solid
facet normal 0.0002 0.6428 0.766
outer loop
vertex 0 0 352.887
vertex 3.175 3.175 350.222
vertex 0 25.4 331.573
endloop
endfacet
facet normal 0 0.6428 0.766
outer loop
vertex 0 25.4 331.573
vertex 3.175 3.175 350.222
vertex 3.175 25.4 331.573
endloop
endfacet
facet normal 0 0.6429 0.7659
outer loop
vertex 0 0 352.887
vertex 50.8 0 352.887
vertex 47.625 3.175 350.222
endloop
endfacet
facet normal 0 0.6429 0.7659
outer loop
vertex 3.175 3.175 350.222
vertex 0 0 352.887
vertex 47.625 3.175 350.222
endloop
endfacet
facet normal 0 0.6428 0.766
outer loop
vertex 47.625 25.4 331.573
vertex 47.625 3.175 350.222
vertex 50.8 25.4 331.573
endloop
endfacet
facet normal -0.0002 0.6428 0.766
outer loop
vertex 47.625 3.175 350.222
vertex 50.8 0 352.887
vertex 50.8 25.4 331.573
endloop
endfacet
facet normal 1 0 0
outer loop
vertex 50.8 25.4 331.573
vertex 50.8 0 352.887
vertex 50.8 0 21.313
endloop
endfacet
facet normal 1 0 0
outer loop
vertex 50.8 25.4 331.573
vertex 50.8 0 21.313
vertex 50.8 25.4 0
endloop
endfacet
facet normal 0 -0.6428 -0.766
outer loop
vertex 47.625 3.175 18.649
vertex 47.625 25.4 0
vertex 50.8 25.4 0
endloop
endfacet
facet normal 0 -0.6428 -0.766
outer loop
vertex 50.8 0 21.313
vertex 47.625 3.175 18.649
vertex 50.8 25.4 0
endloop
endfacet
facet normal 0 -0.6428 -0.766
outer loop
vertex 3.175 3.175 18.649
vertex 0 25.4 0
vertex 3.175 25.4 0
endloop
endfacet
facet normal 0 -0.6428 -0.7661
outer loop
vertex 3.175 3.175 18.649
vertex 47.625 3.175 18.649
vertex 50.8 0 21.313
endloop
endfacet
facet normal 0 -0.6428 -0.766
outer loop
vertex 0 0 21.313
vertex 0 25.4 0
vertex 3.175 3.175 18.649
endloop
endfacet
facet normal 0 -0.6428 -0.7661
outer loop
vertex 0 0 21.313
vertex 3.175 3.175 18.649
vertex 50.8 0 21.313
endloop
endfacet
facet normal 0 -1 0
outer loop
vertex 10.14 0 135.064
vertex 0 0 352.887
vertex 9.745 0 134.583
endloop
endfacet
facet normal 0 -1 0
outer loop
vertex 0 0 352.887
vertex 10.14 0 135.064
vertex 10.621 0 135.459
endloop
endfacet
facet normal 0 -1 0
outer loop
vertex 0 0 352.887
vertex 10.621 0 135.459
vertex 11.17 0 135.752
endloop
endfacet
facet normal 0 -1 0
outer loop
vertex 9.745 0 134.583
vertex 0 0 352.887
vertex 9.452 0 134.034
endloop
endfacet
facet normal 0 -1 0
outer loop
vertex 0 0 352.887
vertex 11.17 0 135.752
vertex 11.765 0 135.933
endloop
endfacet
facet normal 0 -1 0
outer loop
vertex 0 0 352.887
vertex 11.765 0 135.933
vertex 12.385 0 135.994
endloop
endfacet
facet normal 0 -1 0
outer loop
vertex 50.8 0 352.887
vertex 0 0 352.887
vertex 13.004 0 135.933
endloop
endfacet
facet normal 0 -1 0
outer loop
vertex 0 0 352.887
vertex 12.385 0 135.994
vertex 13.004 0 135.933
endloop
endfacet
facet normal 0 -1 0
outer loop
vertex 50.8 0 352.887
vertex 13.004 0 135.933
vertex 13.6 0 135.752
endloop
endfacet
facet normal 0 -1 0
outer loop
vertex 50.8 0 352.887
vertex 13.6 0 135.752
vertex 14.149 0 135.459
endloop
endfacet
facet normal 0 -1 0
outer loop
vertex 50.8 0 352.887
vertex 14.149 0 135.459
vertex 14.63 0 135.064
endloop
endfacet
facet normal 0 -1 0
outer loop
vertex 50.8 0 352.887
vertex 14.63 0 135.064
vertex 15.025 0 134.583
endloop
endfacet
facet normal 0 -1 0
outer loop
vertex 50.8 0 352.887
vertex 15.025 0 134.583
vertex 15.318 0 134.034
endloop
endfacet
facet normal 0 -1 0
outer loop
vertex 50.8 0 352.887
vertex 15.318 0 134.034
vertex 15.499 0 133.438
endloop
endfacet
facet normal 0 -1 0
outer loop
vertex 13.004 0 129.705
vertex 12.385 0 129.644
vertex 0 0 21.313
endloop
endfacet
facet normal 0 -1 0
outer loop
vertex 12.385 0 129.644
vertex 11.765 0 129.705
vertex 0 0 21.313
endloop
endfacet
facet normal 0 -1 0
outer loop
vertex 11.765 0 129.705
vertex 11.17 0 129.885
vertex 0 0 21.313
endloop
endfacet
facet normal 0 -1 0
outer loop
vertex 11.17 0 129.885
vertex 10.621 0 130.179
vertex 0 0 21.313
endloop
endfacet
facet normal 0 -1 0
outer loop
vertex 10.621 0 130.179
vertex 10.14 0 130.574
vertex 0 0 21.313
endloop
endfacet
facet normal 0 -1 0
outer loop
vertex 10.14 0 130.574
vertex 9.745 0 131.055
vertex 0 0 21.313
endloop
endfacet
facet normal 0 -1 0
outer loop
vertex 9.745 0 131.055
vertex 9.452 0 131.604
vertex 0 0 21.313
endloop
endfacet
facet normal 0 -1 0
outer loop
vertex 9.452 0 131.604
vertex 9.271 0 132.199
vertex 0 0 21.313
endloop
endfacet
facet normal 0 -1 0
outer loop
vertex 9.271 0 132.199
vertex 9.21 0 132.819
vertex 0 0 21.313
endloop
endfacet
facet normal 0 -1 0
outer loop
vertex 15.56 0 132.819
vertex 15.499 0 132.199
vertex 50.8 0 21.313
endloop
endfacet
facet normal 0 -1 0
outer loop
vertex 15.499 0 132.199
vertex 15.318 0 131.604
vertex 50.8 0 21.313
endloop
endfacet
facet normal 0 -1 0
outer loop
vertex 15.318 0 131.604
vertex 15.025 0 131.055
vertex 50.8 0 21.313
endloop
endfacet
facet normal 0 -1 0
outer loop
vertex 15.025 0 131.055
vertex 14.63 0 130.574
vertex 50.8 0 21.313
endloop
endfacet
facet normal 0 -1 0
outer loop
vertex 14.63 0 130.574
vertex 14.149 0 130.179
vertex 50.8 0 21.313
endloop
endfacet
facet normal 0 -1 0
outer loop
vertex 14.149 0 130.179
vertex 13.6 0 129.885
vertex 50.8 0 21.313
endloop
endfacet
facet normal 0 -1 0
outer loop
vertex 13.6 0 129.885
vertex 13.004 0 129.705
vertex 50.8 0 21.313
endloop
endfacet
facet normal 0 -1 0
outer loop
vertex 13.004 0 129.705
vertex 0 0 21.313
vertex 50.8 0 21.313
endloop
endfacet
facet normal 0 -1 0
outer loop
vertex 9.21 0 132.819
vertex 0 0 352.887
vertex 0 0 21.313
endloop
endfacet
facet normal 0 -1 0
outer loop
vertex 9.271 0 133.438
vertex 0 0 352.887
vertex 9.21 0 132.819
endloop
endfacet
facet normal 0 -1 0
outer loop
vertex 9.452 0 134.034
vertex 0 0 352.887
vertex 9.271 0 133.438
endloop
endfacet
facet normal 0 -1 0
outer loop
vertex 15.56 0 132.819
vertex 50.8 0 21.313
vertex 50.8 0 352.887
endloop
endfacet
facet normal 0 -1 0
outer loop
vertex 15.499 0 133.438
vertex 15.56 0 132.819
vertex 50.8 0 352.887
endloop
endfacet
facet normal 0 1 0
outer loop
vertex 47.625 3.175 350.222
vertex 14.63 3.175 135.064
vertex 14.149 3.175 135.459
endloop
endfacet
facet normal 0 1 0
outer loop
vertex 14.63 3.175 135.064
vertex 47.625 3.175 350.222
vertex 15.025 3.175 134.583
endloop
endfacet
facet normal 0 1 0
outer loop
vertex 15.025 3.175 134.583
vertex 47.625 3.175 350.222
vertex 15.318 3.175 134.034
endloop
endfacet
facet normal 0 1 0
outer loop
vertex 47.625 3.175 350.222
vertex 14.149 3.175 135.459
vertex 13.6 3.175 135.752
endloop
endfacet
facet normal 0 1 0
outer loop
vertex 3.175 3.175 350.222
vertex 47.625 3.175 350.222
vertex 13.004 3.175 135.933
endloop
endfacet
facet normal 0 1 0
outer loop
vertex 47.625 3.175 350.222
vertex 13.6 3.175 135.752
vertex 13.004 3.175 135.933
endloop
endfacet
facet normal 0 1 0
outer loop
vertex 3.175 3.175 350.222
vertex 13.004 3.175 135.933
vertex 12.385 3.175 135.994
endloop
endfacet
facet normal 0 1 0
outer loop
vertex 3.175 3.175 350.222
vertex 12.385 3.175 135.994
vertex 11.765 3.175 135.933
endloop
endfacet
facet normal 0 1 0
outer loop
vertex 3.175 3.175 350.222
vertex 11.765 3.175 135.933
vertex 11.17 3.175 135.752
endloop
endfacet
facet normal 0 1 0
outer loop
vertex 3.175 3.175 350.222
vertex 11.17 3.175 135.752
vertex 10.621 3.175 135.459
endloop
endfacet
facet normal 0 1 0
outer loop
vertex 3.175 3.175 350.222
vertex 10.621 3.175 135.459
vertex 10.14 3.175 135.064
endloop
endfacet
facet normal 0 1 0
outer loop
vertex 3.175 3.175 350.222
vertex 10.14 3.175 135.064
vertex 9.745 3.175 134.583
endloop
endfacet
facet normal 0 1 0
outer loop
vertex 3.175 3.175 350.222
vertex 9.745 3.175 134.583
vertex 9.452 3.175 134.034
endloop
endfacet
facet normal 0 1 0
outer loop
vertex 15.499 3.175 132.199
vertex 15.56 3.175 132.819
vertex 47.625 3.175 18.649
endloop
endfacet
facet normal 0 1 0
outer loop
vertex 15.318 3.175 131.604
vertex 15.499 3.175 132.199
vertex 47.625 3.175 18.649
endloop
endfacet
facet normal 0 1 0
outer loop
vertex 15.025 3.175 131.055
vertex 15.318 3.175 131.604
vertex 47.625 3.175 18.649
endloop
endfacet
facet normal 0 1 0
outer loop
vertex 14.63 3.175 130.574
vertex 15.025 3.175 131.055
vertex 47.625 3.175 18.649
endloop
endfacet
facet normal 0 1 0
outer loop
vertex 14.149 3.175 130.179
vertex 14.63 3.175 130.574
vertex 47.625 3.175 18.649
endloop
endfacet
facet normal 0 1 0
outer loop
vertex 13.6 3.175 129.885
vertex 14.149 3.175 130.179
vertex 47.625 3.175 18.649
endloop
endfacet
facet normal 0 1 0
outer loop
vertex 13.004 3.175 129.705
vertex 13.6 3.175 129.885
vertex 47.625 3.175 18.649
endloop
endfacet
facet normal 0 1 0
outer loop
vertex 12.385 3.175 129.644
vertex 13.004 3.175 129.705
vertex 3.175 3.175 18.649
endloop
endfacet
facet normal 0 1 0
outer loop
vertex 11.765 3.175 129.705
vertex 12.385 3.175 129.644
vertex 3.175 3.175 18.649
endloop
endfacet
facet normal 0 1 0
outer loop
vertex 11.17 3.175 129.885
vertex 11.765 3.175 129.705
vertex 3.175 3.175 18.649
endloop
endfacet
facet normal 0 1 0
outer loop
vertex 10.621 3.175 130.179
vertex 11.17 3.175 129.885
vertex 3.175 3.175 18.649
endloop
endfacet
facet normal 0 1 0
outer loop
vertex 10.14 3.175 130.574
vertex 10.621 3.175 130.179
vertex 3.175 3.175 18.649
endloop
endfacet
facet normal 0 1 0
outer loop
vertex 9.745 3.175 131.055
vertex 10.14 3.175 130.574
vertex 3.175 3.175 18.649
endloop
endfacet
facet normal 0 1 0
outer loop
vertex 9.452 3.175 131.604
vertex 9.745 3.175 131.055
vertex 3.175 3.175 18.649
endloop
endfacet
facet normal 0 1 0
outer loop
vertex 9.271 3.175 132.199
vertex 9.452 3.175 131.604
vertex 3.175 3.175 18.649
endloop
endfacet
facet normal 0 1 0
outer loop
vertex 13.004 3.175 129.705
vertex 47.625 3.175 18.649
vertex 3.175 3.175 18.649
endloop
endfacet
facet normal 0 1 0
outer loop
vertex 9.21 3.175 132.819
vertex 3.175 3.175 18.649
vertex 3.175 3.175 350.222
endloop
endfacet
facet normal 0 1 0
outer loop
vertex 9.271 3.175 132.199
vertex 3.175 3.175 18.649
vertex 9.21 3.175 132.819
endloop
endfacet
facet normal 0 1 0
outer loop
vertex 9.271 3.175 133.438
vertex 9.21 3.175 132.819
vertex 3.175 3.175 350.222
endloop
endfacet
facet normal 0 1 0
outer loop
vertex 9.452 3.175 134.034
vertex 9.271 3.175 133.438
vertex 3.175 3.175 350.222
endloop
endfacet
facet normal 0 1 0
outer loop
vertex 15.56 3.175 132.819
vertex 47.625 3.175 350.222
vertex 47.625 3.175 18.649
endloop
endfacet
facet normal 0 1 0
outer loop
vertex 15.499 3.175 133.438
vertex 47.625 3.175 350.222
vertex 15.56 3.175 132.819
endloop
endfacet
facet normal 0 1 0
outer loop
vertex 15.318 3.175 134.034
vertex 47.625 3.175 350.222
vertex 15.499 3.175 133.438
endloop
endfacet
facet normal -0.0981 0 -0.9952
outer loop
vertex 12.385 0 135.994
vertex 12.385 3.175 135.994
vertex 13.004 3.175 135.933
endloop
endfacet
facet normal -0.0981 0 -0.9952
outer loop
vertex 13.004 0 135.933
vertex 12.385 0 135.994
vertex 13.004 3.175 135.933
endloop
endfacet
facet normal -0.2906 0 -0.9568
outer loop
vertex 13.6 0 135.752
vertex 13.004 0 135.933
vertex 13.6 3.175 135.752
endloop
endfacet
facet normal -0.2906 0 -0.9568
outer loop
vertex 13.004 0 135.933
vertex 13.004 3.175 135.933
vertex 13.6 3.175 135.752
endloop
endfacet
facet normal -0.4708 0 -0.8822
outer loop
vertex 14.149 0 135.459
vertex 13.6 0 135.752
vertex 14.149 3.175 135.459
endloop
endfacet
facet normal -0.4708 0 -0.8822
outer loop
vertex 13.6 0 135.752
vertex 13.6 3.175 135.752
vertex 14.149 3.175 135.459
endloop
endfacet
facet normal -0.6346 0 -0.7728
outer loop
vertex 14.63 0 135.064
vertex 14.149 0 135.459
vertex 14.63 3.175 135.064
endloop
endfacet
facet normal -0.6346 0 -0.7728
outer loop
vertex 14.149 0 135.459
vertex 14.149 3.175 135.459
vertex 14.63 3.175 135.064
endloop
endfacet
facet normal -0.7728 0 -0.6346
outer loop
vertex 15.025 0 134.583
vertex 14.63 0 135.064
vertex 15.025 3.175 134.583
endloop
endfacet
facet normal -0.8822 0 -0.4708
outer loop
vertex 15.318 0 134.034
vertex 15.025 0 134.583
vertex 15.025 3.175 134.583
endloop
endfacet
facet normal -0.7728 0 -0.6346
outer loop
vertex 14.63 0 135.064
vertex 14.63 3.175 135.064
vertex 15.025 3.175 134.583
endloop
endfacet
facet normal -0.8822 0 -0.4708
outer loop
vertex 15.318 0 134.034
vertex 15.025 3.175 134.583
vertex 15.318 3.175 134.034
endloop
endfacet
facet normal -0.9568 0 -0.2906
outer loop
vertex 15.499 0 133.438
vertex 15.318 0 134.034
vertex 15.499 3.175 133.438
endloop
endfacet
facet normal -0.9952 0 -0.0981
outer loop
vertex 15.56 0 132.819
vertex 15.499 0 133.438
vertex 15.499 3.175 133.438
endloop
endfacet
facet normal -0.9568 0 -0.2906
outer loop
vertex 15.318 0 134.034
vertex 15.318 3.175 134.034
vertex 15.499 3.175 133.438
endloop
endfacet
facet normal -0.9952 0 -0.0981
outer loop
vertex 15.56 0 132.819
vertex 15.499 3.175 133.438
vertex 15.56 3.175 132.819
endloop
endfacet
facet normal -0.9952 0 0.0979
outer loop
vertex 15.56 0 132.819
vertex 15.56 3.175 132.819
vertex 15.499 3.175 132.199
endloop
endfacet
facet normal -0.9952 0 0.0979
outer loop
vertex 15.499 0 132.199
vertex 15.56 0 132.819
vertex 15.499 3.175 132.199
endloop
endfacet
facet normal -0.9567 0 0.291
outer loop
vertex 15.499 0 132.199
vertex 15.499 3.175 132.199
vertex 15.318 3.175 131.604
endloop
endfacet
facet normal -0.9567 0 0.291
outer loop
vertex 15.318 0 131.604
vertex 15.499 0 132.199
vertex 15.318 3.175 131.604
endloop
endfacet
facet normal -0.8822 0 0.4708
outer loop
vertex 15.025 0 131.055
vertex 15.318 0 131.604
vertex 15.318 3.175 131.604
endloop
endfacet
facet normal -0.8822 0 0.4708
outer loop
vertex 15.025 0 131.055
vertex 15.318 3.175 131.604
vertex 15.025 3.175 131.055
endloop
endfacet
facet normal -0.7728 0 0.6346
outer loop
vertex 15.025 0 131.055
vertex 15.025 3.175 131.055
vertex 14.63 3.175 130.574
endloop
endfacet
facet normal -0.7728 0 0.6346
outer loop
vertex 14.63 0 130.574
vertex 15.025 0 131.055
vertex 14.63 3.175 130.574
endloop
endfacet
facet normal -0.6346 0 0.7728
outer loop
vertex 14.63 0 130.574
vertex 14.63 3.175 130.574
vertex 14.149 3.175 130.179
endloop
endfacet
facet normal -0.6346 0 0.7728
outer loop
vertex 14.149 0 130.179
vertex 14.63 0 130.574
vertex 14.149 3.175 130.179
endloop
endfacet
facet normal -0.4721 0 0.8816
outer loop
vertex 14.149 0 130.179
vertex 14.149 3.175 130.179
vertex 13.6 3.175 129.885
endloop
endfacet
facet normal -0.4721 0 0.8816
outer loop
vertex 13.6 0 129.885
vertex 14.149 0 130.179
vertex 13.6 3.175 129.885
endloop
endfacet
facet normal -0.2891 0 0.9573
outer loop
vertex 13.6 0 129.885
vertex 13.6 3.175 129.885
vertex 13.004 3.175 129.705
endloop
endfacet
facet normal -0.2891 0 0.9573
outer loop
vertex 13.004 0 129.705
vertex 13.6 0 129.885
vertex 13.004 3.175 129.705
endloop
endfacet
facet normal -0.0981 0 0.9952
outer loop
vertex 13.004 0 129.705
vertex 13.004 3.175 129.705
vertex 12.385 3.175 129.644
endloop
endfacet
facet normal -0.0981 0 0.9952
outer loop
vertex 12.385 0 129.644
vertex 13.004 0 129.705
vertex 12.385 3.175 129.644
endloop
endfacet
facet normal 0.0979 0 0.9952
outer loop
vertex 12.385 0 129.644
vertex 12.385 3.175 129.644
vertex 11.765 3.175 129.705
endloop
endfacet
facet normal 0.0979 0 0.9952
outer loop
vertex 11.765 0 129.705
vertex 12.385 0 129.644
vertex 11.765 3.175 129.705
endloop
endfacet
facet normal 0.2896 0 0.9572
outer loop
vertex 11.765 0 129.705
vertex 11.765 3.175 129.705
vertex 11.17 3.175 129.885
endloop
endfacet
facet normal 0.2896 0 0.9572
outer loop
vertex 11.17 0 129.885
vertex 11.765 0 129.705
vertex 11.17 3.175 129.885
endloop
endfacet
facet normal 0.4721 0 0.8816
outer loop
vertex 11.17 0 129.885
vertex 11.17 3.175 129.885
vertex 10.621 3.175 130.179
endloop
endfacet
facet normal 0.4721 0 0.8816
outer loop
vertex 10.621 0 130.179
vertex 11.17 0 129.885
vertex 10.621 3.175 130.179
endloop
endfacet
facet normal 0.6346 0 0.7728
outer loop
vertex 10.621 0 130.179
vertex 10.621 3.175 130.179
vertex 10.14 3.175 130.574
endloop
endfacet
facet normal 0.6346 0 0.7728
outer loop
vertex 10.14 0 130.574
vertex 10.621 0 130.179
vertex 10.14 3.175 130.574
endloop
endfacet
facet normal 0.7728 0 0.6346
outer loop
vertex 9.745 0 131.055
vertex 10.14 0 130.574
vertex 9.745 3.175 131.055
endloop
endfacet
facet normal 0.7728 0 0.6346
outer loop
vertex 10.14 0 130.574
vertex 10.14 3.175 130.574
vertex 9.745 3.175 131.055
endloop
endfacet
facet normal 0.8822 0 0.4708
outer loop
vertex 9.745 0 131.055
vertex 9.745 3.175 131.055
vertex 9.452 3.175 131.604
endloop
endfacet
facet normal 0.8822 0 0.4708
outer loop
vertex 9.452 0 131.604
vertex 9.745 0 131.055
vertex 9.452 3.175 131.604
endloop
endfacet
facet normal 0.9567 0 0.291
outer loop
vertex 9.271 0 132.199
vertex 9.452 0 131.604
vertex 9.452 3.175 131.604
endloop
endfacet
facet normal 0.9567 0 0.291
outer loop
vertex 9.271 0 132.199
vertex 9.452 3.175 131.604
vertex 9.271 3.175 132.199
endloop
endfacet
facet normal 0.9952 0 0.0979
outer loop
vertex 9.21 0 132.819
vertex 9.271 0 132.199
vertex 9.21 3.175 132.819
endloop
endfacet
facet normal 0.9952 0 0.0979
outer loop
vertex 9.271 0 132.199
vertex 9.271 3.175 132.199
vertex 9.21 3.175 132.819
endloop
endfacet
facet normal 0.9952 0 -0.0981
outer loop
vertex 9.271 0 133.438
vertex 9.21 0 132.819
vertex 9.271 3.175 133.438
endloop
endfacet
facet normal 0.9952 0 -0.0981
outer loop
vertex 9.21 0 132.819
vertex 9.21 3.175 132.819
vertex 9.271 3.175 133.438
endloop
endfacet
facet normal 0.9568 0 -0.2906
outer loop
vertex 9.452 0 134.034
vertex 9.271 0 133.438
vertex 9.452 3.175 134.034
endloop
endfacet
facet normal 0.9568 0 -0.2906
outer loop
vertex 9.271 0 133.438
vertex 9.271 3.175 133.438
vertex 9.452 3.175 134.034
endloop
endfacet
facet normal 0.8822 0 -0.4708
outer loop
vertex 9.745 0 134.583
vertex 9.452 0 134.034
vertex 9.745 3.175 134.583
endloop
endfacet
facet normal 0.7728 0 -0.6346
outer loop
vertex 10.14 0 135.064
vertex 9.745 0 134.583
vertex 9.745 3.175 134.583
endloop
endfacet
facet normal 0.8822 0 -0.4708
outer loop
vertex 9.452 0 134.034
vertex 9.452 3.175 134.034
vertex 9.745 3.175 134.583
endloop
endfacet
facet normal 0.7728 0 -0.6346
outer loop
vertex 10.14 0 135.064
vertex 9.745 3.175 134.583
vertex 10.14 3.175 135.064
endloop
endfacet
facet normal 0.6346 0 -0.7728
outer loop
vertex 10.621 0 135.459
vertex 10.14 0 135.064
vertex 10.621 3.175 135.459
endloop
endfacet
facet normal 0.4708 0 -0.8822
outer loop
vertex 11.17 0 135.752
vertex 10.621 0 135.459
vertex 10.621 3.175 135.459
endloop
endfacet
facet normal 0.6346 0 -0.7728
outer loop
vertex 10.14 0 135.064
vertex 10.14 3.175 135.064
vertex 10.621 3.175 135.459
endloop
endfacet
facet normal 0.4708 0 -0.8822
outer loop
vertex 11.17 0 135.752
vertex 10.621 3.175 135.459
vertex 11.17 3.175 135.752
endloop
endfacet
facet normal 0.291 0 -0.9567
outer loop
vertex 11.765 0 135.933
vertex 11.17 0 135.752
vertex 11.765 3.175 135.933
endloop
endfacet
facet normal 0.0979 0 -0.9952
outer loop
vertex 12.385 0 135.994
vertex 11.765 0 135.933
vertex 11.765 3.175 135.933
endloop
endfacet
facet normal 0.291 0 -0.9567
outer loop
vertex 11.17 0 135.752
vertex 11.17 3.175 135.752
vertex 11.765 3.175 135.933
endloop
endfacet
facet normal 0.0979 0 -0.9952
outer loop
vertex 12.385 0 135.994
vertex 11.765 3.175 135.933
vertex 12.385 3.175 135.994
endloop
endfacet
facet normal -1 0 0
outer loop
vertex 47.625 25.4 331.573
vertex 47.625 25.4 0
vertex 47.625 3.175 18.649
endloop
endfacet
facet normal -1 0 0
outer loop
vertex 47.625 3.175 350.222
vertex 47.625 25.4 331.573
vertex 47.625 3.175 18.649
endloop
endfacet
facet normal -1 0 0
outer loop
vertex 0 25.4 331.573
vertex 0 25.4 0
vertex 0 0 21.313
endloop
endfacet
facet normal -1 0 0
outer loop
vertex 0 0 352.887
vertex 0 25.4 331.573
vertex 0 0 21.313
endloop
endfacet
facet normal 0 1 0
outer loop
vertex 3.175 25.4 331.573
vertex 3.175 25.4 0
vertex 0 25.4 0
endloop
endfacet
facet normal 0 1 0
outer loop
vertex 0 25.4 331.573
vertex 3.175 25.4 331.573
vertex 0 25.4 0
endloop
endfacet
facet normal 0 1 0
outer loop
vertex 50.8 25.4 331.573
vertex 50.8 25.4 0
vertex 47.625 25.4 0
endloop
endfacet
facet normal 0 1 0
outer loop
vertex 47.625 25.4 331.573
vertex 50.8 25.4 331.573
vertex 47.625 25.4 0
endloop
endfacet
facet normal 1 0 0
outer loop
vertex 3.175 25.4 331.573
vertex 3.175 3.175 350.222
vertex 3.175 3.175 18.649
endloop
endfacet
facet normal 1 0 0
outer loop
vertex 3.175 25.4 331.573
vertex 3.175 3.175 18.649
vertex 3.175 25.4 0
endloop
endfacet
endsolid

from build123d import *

# Parameters (mm, degrees)
BOSS_EXTRUDE1_DEPTH = 457.2
CUT_EXTRUDE1_REACH  = 462.55
SKETCH2_R           = 3.175
CUT_EXTRUDE2_DEPTH  = 461.714271539
CUT_EXTRUDE3_DEPTH  = 461.714271539


with BuildPart() as part:
    # Sketch1 → Boss-Extrude1 (new body)
    with BuildSketch(Plane.XY):
        Polygon((3.175, 3.175), (3.175, 25.4), (0, 25.4), (0, 0), (50.8, 0), (50.8, 25.4), (47.625, 25.4), (47.625, 3.175), align=None)
    extrude(amount=BOSS_EXTRUDE1_DEPTH)

    # Sketch2 → Cut-Extrude1 (cut, up to next)
    with BuildSketch(Plane(origin=(0, 3.175, 0), x_dir=(1, 0, 0), z_dir=(0, 1, 0)), mode=Mode.PRIVATE) as cut_extrude1_sk1:
        with Locations(Location((12.384908578, -132.81875466, 0), (0, 0, 270))):
            Circle(SKETCH2_R)
    cut_extrude1_tool1 = extrude(cut_extrude1_sk1.sketch, amount=-CUT_EXTRUDE1_REACH, mode=Mode.PRIVATE) & part.part
    add(cut_extrude1_tool1.solids().sort_by_distance((12.384909, 3.175, 132.818755))[0], mode=Mode.SUBTRACT)

    # Sketch3 → Cut-Extrude2 (cut, through all)
    with BuildSketch(Plane.ZY):
        Polygon((0, 25.4), (21.313130632, 0), (0, 0), align=None)
    extrude(amount=-CUT_EXTRUDE2_DEPTH, mode=Mode.SUBTRACT)

    # Sketch4 → Cut-Extrude3 (cut, through all)
    with BuildSketch(Plane(origin=(50.8, 0, 0), x_dir=(0, 0, -1), z_dir=(1, 0, 0))):
        Polygon((-352.886582122, 0), (-331.57345149, 25.4), (-457.2, 25.4), (-457.2, 0), align=None)
    extrude(amount=-CUT_EXTRUDE3_DEPTH, mode=Mode.SUBTRACT)


solid = part.part
